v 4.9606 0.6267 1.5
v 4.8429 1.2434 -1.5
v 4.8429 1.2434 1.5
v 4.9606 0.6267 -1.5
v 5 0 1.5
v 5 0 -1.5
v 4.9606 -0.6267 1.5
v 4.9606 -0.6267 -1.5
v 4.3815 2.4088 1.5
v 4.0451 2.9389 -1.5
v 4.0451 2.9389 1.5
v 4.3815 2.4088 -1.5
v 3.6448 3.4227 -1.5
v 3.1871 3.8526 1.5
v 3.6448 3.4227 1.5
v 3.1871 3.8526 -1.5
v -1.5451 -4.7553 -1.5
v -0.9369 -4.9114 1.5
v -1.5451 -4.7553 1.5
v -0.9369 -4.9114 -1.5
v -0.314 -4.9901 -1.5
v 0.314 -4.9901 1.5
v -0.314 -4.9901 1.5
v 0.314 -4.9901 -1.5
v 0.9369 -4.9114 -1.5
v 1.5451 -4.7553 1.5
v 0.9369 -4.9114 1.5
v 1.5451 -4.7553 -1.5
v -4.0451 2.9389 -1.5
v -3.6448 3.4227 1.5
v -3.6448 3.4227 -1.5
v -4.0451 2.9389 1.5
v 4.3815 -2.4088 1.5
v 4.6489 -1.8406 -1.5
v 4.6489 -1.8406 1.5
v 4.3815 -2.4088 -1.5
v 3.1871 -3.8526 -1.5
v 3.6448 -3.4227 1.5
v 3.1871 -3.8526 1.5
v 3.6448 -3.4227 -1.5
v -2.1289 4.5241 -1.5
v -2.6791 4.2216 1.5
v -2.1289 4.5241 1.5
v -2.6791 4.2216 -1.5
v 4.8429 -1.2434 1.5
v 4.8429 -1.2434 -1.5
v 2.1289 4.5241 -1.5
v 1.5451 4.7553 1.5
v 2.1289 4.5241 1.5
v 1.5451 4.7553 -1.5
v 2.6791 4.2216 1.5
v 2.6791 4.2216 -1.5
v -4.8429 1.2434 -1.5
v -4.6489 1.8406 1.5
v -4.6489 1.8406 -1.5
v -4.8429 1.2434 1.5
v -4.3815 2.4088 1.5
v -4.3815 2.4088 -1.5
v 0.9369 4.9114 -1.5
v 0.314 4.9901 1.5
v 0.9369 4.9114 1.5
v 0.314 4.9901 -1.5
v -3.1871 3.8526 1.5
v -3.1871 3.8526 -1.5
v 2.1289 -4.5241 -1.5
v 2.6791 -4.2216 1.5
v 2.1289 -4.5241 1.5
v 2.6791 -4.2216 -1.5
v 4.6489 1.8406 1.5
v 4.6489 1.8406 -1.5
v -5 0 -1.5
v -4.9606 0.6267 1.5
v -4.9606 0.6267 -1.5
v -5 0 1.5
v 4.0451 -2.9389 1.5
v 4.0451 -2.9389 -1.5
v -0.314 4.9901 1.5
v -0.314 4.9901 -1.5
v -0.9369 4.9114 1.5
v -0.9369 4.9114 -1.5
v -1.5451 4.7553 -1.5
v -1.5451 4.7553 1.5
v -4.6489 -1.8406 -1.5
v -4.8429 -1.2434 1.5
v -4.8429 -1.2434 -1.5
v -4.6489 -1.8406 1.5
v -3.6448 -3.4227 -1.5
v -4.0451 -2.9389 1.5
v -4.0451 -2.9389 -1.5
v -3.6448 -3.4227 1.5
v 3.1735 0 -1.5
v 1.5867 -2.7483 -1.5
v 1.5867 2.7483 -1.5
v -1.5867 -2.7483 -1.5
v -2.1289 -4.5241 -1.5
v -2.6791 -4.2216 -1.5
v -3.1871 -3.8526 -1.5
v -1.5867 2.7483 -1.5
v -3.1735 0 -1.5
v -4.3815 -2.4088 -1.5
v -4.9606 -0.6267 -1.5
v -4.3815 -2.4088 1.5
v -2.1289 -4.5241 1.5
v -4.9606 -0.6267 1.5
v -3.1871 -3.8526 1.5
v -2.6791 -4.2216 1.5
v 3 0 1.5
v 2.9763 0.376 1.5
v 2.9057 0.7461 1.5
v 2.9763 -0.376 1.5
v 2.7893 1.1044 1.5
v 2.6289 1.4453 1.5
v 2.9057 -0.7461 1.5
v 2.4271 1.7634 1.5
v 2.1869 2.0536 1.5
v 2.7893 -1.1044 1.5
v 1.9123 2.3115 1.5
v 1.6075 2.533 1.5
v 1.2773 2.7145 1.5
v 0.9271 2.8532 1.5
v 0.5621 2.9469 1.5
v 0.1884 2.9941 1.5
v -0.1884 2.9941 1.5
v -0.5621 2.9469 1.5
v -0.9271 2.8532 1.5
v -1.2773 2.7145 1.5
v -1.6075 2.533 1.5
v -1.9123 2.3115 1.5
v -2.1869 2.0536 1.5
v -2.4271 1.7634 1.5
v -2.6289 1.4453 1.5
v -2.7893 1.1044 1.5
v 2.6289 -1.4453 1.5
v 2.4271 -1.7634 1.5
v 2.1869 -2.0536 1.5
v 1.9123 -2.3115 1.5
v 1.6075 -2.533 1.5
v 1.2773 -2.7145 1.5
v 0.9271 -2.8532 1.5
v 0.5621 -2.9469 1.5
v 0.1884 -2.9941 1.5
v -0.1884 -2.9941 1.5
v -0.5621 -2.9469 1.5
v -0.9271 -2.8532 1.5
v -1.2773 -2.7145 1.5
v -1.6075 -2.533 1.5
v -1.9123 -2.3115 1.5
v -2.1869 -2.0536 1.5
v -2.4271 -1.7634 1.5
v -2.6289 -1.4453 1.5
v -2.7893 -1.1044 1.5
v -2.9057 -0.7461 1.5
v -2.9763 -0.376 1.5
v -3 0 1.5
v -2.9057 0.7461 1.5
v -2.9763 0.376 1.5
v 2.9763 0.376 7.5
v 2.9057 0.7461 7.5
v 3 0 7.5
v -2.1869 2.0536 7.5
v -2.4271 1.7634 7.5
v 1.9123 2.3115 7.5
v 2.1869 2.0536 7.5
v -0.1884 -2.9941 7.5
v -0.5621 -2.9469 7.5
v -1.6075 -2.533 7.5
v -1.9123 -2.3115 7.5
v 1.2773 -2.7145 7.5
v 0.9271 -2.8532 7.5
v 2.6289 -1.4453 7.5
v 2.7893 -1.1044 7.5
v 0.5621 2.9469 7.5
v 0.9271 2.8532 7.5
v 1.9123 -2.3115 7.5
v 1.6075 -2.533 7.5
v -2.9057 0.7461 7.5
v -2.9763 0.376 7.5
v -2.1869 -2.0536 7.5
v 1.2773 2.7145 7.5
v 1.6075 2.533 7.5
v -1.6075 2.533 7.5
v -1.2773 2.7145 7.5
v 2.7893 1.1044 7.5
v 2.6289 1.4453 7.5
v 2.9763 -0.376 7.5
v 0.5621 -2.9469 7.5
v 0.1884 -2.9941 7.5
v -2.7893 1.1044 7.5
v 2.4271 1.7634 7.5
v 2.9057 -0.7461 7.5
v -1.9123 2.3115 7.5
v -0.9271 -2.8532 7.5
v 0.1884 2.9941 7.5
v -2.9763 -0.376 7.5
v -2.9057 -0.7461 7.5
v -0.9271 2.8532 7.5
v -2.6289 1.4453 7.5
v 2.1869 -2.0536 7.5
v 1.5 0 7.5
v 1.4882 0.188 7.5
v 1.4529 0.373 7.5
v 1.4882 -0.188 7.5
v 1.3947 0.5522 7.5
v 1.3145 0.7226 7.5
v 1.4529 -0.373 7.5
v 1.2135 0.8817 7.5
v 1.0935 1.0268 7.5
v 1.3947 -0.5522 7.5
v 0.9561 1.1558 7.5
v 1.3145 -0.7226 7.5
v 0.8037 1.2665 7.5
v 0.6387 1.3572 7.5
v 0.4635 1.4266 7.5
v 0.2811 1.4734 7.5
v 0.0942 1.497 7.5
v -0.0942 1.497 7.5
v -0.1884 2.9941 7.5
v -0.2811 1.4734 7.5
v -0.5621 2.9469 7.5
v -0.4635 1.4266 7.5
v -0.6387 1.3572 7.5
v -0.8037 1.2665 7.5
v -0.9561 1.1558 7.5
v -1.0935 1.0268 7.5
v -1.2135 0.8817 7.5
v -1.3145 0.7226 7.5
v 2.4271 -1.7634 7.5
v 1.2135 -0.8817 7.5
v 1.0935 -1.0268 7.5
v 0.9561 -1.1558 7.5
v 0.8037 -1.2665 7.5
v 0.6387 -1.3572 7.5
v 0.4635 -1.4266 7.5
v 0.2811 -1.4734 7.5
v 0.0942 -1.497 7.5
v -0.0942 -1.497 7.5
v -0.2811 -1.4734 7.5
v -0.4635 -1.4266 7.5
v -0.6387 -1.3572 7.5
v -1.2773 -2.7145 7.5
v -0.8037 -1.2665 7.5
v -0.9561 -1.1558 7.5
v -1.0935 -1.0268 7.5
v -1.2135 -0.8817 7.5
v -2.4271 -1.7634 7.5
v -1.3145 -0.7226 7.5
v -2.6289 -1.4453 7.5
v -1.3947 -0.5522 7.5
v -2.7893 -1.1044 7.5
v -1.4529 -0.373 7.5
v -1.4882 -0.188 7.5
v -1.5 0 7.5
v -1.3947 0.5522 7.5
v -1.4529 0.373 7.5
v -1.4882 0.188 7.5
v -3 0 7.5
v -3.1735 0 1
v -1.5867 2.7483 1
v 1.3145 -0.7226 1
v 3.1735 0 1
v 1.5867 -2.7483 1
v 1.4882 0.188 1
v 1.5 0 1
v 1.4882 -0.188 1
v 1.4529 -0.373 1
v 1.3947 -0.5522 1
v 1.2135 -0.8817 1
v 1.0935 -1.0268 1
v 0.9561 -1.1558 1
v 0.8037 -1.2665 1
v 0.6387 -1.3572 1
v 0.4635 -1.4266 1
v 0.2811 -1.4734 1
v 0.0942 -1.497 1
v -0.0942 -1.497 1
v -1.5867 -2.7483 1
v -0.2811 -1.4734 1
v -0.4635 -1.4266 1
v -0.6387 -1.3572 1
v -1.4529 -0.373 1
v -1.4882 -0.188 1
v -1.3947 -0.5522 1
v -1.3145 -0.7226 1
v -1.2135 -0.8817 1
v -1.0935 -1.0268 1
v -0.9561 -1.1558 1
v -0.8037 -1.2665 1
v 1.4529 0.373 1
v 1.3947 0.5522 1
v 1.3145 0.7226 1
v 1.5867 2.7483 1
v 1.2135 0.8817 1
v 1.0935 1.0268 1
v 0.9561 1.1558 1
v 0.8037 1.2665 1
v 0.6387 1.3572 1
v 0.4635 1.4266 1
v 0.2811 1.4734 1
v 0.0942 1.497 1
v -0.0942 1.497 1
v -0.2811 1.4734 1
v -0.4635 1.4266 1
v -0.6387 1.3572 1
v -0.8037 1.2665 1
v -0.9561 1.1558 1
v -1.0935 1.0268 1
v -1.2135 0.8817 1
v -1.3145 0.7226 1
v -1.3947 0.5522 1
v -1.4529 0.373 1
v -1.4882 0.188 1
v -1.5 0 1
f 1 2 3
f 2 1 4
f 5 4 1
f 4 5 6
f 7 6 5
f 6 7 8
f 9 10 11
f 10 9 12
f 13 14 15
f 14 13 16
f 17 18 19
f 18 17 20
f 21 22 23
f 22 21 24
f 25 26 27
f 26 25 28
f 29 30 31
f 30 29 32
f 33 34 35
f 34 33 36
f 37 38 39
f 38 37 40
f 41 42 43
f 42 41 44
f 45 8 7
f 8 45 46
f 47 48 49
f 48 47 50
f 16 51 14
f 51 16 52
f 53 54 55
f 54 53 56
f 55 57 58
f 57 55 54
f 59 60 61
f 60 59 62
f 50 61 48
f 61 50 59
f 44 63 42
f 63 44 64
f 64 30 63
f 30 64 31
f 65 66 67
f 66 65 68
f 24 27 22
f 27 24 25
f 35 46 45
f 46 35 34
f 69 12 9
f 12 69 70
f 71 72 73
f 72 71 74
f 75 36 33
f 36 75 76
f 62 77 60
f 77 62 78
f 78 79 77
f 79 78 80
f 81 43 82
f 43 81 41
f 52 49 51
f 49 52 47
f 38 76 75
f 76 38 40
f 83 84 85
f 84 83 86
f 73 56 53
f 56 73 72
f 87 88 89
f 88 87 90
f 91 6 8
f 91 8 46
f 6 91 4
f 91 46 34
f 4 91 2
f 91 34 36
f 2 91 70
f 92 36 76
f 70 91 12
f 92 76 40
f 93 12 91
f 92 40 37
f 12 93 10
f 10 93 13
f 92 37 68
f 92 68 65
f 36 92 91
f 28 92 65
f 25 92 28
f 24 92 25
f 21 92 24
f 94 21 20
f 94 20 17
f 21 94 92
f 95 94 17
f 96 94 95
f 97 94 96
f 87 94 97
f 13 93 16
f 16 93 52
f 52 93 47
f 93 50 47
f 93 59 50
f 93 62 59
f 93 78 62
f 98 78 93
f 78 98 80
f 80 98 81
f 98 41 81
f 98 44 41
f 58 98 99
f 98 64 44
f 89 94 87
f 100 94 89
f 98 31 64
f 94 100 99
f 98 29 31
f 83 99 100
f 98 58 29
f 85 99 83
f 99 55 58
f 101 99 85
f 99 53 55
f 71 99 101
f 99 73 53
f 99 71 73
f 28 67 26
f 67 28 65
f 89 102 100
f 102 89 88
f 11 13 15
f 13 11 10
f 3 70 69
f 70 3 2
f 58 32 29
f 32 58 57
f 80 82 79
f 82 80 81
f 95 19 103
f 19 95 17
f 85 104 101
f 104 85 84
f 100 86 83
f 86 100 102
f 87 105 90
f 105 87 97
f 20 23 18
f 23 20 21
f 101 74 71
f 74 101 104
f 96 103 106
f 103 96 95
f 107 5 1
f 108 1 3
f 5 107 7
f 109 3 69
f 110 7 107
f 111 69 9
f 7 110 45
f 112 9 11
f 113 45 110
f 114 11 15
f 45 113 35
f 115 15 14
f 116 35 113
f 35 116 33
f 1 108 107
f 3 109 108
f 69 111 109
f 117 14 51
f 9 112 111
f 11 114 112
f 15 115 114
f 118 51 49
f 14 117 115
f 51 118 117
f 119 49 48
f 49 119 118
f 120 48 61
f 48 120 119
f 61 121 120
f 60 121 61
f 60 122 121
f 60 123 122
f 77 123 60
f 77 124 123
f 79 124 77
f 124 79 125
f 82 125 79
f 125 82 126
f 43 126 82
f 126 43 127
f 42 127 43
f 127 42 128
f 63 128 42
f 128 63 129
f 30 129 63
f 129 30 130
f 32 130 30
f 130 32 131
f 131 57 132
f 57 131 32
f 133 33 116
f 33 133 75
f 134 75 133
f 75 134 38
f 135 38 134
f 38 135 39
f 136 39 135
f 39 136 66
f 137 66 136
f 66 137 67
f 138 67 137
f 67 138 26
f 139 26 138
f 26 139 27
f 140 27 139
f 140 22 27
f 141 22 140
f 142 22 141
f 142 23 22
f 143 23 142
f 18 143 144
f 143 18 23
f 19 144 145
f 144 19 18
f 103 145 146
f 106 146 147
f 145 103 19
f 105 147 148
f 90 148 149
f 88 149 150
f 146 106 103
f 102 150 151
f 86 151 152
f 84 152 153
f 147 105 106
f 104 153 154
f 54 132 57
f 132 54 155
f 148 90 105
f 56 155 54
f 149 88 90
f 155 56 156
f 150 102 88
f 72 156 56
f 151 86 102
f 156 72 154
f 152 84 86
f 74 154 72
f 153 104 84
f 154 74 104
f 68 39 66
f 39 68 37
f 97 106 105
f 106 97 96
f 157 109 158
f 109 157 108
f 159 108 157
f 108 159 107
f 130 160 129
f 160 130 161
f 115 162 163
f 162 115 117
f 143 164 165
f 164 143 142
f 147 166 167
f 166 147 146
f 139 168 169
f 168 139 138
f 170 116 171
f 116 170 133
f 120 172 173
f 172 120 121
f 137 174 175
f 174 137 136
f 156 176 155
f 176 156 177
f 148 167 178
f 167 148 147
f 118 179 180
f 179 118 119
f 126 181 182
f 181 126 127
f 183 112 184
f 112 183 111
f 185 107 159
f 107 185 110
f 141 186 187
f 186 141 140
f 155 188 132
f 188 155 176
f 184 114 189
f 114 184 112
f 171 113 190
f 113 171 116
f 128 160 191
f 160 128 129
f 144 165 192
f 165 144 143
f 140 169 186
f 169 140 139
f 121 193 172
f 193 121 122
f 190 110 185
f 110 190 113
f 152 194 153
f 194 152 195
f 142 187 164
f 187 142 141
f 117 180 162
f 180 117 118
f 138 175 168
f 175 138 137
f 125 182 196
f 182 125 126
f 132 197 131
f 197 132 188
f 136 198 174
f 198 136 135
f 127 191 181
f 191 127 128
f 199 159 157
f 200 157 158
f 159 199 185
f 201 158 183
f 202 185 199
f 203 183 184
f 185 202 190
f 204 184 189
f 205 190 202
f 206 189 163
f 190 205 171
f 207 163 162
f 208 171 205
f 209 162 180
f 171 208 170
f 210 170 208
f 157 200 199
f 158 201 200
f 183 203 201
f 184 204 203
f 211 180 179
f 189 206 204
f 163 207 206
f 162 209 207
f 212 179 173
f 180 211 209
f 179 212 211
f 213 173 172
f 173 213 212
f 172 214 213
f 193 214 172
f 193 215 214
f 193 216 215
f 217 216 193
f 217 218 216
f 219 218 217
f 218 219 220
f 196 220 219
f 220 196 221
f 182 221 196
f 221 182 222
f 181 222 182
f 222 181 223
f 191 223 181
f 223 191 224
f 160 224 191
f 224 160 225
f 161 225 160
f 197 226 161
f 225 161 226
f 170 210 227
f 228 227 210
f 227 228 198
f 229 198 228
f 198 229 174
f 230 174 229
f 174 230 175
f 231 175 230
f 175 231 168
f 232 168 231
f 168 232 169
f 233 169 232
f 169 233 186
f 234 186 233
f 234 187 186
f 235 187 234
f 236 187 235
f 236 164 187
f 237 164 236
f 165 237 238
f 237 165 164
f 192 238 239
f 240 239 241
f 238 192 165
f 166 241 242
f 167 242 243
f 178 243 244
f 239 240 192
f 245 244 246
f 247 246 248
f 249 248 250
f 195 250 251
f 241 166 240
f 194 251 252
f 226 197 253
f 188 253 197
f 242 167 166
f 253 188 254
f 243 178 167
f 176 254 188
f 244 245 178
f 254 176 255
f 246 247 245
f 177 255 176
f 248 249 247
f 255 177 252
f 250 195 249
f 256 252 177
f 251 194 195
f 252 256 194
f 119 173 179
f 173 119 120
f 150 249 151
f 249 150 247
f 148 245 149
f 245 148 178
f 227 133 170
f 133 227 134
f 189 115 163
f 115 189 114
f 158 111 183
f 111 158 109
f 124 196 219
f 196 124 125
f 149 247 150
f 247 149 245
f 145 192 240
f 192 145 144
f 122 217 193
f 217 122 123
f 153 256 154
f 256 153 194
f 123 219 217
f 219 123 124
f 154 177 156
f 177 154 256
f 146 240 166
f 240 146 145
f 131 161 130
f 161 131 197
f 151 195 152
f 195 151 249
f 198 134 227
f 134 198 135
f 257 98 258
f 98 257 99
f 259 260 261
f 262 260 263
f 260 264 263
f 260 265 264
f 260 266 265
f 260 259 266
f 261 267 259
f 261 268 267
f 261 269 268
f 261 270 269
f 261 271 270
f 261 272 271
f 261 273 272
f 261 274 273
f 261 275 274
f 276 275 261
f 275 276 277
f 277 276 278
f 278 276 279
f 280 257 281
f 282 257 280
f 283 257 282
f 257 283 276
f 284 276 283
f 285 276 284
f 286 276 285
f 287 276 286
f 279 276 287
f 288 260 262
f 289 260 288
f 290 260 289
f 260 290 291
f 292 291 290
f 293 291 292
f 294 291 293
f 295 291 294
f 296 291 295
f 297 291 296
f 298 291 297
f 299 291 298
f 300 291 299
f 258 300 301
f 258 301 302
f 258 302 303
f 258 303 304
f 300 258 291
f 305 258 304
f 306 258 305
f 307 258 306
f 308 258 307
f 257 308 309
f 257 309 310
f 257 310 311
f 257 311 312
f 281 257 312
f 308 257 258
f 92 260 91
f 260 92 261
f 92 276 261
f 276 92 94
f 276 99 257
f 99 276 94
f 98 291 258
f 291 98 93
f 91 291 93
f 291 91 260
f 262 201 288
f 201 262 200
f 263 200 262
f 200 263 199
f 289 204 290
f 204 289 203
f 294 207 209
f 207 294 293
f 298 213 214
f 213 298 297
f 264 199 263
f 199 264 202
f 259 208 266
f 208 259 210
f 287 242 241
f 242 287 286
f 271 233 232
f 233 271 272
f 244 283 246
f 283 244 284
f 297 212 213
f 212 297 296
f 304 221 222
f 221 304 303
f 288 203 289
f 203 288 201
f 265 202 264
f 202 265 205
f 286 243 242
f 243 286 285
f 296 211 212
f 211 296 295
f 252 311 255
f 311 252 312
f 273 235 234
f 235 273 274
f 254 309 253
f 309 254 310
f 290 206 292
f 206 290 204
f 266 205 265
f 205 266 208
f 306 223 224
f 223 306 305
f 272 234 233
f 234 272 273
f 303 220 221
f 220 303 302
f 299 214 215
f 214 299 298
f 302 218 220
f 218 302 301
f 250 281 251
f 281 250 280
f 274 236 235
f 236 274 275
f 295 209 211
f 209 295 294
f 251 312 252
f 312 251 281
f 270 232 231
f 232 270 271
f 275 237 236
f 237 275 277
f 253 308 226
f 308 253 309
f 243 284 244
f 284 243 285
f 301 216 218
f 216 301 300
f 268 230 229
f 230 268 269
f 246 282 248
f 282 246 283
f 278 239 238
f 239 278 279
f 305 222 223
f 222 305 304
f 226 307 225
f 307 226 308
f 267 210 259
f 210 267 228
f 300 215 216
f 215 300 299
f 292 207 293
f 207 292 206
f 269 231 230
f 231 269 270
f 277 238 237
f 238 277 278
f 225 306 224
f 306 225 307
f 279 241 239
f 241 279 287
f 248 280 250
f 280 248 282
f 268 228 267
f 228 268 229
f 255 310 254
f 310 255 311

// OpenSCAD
$fn = 50;


difference() {
	union() {
		translate(v = [0, 0, -1.5000000000]) {
			cylinder(h = 3, r = 5.0000000000);
		}
		translate(v = [0, 0, -1.5000000000]) {
			cylinder(h = 9, r = 3.0000000000);
		}
	}
	union() {
		translate(v = [0, 0, -1.5000000000]) {
			rotate(a = [0, 0, 0]) {
				difference() {
					union() {
						#linear_extrude(height = 2.5000000000) {
							polygon(points = [[3.1735000000, 0.0000000000], [1.5867500000, 2.7483316189], [-1.5867500000, 2.7483316189], [-3.1735000000, 0.0000000000], [-1.5867500000, -2.7483316189], [1.5867500000, -2.7483316189]]);
						}
					}
					union();
				}
			}
		}
		translate(v = [0, 0, -50.0000000000]) {
			cylinder(h = 100, r = 1.5000000000);
		}
	}
}
